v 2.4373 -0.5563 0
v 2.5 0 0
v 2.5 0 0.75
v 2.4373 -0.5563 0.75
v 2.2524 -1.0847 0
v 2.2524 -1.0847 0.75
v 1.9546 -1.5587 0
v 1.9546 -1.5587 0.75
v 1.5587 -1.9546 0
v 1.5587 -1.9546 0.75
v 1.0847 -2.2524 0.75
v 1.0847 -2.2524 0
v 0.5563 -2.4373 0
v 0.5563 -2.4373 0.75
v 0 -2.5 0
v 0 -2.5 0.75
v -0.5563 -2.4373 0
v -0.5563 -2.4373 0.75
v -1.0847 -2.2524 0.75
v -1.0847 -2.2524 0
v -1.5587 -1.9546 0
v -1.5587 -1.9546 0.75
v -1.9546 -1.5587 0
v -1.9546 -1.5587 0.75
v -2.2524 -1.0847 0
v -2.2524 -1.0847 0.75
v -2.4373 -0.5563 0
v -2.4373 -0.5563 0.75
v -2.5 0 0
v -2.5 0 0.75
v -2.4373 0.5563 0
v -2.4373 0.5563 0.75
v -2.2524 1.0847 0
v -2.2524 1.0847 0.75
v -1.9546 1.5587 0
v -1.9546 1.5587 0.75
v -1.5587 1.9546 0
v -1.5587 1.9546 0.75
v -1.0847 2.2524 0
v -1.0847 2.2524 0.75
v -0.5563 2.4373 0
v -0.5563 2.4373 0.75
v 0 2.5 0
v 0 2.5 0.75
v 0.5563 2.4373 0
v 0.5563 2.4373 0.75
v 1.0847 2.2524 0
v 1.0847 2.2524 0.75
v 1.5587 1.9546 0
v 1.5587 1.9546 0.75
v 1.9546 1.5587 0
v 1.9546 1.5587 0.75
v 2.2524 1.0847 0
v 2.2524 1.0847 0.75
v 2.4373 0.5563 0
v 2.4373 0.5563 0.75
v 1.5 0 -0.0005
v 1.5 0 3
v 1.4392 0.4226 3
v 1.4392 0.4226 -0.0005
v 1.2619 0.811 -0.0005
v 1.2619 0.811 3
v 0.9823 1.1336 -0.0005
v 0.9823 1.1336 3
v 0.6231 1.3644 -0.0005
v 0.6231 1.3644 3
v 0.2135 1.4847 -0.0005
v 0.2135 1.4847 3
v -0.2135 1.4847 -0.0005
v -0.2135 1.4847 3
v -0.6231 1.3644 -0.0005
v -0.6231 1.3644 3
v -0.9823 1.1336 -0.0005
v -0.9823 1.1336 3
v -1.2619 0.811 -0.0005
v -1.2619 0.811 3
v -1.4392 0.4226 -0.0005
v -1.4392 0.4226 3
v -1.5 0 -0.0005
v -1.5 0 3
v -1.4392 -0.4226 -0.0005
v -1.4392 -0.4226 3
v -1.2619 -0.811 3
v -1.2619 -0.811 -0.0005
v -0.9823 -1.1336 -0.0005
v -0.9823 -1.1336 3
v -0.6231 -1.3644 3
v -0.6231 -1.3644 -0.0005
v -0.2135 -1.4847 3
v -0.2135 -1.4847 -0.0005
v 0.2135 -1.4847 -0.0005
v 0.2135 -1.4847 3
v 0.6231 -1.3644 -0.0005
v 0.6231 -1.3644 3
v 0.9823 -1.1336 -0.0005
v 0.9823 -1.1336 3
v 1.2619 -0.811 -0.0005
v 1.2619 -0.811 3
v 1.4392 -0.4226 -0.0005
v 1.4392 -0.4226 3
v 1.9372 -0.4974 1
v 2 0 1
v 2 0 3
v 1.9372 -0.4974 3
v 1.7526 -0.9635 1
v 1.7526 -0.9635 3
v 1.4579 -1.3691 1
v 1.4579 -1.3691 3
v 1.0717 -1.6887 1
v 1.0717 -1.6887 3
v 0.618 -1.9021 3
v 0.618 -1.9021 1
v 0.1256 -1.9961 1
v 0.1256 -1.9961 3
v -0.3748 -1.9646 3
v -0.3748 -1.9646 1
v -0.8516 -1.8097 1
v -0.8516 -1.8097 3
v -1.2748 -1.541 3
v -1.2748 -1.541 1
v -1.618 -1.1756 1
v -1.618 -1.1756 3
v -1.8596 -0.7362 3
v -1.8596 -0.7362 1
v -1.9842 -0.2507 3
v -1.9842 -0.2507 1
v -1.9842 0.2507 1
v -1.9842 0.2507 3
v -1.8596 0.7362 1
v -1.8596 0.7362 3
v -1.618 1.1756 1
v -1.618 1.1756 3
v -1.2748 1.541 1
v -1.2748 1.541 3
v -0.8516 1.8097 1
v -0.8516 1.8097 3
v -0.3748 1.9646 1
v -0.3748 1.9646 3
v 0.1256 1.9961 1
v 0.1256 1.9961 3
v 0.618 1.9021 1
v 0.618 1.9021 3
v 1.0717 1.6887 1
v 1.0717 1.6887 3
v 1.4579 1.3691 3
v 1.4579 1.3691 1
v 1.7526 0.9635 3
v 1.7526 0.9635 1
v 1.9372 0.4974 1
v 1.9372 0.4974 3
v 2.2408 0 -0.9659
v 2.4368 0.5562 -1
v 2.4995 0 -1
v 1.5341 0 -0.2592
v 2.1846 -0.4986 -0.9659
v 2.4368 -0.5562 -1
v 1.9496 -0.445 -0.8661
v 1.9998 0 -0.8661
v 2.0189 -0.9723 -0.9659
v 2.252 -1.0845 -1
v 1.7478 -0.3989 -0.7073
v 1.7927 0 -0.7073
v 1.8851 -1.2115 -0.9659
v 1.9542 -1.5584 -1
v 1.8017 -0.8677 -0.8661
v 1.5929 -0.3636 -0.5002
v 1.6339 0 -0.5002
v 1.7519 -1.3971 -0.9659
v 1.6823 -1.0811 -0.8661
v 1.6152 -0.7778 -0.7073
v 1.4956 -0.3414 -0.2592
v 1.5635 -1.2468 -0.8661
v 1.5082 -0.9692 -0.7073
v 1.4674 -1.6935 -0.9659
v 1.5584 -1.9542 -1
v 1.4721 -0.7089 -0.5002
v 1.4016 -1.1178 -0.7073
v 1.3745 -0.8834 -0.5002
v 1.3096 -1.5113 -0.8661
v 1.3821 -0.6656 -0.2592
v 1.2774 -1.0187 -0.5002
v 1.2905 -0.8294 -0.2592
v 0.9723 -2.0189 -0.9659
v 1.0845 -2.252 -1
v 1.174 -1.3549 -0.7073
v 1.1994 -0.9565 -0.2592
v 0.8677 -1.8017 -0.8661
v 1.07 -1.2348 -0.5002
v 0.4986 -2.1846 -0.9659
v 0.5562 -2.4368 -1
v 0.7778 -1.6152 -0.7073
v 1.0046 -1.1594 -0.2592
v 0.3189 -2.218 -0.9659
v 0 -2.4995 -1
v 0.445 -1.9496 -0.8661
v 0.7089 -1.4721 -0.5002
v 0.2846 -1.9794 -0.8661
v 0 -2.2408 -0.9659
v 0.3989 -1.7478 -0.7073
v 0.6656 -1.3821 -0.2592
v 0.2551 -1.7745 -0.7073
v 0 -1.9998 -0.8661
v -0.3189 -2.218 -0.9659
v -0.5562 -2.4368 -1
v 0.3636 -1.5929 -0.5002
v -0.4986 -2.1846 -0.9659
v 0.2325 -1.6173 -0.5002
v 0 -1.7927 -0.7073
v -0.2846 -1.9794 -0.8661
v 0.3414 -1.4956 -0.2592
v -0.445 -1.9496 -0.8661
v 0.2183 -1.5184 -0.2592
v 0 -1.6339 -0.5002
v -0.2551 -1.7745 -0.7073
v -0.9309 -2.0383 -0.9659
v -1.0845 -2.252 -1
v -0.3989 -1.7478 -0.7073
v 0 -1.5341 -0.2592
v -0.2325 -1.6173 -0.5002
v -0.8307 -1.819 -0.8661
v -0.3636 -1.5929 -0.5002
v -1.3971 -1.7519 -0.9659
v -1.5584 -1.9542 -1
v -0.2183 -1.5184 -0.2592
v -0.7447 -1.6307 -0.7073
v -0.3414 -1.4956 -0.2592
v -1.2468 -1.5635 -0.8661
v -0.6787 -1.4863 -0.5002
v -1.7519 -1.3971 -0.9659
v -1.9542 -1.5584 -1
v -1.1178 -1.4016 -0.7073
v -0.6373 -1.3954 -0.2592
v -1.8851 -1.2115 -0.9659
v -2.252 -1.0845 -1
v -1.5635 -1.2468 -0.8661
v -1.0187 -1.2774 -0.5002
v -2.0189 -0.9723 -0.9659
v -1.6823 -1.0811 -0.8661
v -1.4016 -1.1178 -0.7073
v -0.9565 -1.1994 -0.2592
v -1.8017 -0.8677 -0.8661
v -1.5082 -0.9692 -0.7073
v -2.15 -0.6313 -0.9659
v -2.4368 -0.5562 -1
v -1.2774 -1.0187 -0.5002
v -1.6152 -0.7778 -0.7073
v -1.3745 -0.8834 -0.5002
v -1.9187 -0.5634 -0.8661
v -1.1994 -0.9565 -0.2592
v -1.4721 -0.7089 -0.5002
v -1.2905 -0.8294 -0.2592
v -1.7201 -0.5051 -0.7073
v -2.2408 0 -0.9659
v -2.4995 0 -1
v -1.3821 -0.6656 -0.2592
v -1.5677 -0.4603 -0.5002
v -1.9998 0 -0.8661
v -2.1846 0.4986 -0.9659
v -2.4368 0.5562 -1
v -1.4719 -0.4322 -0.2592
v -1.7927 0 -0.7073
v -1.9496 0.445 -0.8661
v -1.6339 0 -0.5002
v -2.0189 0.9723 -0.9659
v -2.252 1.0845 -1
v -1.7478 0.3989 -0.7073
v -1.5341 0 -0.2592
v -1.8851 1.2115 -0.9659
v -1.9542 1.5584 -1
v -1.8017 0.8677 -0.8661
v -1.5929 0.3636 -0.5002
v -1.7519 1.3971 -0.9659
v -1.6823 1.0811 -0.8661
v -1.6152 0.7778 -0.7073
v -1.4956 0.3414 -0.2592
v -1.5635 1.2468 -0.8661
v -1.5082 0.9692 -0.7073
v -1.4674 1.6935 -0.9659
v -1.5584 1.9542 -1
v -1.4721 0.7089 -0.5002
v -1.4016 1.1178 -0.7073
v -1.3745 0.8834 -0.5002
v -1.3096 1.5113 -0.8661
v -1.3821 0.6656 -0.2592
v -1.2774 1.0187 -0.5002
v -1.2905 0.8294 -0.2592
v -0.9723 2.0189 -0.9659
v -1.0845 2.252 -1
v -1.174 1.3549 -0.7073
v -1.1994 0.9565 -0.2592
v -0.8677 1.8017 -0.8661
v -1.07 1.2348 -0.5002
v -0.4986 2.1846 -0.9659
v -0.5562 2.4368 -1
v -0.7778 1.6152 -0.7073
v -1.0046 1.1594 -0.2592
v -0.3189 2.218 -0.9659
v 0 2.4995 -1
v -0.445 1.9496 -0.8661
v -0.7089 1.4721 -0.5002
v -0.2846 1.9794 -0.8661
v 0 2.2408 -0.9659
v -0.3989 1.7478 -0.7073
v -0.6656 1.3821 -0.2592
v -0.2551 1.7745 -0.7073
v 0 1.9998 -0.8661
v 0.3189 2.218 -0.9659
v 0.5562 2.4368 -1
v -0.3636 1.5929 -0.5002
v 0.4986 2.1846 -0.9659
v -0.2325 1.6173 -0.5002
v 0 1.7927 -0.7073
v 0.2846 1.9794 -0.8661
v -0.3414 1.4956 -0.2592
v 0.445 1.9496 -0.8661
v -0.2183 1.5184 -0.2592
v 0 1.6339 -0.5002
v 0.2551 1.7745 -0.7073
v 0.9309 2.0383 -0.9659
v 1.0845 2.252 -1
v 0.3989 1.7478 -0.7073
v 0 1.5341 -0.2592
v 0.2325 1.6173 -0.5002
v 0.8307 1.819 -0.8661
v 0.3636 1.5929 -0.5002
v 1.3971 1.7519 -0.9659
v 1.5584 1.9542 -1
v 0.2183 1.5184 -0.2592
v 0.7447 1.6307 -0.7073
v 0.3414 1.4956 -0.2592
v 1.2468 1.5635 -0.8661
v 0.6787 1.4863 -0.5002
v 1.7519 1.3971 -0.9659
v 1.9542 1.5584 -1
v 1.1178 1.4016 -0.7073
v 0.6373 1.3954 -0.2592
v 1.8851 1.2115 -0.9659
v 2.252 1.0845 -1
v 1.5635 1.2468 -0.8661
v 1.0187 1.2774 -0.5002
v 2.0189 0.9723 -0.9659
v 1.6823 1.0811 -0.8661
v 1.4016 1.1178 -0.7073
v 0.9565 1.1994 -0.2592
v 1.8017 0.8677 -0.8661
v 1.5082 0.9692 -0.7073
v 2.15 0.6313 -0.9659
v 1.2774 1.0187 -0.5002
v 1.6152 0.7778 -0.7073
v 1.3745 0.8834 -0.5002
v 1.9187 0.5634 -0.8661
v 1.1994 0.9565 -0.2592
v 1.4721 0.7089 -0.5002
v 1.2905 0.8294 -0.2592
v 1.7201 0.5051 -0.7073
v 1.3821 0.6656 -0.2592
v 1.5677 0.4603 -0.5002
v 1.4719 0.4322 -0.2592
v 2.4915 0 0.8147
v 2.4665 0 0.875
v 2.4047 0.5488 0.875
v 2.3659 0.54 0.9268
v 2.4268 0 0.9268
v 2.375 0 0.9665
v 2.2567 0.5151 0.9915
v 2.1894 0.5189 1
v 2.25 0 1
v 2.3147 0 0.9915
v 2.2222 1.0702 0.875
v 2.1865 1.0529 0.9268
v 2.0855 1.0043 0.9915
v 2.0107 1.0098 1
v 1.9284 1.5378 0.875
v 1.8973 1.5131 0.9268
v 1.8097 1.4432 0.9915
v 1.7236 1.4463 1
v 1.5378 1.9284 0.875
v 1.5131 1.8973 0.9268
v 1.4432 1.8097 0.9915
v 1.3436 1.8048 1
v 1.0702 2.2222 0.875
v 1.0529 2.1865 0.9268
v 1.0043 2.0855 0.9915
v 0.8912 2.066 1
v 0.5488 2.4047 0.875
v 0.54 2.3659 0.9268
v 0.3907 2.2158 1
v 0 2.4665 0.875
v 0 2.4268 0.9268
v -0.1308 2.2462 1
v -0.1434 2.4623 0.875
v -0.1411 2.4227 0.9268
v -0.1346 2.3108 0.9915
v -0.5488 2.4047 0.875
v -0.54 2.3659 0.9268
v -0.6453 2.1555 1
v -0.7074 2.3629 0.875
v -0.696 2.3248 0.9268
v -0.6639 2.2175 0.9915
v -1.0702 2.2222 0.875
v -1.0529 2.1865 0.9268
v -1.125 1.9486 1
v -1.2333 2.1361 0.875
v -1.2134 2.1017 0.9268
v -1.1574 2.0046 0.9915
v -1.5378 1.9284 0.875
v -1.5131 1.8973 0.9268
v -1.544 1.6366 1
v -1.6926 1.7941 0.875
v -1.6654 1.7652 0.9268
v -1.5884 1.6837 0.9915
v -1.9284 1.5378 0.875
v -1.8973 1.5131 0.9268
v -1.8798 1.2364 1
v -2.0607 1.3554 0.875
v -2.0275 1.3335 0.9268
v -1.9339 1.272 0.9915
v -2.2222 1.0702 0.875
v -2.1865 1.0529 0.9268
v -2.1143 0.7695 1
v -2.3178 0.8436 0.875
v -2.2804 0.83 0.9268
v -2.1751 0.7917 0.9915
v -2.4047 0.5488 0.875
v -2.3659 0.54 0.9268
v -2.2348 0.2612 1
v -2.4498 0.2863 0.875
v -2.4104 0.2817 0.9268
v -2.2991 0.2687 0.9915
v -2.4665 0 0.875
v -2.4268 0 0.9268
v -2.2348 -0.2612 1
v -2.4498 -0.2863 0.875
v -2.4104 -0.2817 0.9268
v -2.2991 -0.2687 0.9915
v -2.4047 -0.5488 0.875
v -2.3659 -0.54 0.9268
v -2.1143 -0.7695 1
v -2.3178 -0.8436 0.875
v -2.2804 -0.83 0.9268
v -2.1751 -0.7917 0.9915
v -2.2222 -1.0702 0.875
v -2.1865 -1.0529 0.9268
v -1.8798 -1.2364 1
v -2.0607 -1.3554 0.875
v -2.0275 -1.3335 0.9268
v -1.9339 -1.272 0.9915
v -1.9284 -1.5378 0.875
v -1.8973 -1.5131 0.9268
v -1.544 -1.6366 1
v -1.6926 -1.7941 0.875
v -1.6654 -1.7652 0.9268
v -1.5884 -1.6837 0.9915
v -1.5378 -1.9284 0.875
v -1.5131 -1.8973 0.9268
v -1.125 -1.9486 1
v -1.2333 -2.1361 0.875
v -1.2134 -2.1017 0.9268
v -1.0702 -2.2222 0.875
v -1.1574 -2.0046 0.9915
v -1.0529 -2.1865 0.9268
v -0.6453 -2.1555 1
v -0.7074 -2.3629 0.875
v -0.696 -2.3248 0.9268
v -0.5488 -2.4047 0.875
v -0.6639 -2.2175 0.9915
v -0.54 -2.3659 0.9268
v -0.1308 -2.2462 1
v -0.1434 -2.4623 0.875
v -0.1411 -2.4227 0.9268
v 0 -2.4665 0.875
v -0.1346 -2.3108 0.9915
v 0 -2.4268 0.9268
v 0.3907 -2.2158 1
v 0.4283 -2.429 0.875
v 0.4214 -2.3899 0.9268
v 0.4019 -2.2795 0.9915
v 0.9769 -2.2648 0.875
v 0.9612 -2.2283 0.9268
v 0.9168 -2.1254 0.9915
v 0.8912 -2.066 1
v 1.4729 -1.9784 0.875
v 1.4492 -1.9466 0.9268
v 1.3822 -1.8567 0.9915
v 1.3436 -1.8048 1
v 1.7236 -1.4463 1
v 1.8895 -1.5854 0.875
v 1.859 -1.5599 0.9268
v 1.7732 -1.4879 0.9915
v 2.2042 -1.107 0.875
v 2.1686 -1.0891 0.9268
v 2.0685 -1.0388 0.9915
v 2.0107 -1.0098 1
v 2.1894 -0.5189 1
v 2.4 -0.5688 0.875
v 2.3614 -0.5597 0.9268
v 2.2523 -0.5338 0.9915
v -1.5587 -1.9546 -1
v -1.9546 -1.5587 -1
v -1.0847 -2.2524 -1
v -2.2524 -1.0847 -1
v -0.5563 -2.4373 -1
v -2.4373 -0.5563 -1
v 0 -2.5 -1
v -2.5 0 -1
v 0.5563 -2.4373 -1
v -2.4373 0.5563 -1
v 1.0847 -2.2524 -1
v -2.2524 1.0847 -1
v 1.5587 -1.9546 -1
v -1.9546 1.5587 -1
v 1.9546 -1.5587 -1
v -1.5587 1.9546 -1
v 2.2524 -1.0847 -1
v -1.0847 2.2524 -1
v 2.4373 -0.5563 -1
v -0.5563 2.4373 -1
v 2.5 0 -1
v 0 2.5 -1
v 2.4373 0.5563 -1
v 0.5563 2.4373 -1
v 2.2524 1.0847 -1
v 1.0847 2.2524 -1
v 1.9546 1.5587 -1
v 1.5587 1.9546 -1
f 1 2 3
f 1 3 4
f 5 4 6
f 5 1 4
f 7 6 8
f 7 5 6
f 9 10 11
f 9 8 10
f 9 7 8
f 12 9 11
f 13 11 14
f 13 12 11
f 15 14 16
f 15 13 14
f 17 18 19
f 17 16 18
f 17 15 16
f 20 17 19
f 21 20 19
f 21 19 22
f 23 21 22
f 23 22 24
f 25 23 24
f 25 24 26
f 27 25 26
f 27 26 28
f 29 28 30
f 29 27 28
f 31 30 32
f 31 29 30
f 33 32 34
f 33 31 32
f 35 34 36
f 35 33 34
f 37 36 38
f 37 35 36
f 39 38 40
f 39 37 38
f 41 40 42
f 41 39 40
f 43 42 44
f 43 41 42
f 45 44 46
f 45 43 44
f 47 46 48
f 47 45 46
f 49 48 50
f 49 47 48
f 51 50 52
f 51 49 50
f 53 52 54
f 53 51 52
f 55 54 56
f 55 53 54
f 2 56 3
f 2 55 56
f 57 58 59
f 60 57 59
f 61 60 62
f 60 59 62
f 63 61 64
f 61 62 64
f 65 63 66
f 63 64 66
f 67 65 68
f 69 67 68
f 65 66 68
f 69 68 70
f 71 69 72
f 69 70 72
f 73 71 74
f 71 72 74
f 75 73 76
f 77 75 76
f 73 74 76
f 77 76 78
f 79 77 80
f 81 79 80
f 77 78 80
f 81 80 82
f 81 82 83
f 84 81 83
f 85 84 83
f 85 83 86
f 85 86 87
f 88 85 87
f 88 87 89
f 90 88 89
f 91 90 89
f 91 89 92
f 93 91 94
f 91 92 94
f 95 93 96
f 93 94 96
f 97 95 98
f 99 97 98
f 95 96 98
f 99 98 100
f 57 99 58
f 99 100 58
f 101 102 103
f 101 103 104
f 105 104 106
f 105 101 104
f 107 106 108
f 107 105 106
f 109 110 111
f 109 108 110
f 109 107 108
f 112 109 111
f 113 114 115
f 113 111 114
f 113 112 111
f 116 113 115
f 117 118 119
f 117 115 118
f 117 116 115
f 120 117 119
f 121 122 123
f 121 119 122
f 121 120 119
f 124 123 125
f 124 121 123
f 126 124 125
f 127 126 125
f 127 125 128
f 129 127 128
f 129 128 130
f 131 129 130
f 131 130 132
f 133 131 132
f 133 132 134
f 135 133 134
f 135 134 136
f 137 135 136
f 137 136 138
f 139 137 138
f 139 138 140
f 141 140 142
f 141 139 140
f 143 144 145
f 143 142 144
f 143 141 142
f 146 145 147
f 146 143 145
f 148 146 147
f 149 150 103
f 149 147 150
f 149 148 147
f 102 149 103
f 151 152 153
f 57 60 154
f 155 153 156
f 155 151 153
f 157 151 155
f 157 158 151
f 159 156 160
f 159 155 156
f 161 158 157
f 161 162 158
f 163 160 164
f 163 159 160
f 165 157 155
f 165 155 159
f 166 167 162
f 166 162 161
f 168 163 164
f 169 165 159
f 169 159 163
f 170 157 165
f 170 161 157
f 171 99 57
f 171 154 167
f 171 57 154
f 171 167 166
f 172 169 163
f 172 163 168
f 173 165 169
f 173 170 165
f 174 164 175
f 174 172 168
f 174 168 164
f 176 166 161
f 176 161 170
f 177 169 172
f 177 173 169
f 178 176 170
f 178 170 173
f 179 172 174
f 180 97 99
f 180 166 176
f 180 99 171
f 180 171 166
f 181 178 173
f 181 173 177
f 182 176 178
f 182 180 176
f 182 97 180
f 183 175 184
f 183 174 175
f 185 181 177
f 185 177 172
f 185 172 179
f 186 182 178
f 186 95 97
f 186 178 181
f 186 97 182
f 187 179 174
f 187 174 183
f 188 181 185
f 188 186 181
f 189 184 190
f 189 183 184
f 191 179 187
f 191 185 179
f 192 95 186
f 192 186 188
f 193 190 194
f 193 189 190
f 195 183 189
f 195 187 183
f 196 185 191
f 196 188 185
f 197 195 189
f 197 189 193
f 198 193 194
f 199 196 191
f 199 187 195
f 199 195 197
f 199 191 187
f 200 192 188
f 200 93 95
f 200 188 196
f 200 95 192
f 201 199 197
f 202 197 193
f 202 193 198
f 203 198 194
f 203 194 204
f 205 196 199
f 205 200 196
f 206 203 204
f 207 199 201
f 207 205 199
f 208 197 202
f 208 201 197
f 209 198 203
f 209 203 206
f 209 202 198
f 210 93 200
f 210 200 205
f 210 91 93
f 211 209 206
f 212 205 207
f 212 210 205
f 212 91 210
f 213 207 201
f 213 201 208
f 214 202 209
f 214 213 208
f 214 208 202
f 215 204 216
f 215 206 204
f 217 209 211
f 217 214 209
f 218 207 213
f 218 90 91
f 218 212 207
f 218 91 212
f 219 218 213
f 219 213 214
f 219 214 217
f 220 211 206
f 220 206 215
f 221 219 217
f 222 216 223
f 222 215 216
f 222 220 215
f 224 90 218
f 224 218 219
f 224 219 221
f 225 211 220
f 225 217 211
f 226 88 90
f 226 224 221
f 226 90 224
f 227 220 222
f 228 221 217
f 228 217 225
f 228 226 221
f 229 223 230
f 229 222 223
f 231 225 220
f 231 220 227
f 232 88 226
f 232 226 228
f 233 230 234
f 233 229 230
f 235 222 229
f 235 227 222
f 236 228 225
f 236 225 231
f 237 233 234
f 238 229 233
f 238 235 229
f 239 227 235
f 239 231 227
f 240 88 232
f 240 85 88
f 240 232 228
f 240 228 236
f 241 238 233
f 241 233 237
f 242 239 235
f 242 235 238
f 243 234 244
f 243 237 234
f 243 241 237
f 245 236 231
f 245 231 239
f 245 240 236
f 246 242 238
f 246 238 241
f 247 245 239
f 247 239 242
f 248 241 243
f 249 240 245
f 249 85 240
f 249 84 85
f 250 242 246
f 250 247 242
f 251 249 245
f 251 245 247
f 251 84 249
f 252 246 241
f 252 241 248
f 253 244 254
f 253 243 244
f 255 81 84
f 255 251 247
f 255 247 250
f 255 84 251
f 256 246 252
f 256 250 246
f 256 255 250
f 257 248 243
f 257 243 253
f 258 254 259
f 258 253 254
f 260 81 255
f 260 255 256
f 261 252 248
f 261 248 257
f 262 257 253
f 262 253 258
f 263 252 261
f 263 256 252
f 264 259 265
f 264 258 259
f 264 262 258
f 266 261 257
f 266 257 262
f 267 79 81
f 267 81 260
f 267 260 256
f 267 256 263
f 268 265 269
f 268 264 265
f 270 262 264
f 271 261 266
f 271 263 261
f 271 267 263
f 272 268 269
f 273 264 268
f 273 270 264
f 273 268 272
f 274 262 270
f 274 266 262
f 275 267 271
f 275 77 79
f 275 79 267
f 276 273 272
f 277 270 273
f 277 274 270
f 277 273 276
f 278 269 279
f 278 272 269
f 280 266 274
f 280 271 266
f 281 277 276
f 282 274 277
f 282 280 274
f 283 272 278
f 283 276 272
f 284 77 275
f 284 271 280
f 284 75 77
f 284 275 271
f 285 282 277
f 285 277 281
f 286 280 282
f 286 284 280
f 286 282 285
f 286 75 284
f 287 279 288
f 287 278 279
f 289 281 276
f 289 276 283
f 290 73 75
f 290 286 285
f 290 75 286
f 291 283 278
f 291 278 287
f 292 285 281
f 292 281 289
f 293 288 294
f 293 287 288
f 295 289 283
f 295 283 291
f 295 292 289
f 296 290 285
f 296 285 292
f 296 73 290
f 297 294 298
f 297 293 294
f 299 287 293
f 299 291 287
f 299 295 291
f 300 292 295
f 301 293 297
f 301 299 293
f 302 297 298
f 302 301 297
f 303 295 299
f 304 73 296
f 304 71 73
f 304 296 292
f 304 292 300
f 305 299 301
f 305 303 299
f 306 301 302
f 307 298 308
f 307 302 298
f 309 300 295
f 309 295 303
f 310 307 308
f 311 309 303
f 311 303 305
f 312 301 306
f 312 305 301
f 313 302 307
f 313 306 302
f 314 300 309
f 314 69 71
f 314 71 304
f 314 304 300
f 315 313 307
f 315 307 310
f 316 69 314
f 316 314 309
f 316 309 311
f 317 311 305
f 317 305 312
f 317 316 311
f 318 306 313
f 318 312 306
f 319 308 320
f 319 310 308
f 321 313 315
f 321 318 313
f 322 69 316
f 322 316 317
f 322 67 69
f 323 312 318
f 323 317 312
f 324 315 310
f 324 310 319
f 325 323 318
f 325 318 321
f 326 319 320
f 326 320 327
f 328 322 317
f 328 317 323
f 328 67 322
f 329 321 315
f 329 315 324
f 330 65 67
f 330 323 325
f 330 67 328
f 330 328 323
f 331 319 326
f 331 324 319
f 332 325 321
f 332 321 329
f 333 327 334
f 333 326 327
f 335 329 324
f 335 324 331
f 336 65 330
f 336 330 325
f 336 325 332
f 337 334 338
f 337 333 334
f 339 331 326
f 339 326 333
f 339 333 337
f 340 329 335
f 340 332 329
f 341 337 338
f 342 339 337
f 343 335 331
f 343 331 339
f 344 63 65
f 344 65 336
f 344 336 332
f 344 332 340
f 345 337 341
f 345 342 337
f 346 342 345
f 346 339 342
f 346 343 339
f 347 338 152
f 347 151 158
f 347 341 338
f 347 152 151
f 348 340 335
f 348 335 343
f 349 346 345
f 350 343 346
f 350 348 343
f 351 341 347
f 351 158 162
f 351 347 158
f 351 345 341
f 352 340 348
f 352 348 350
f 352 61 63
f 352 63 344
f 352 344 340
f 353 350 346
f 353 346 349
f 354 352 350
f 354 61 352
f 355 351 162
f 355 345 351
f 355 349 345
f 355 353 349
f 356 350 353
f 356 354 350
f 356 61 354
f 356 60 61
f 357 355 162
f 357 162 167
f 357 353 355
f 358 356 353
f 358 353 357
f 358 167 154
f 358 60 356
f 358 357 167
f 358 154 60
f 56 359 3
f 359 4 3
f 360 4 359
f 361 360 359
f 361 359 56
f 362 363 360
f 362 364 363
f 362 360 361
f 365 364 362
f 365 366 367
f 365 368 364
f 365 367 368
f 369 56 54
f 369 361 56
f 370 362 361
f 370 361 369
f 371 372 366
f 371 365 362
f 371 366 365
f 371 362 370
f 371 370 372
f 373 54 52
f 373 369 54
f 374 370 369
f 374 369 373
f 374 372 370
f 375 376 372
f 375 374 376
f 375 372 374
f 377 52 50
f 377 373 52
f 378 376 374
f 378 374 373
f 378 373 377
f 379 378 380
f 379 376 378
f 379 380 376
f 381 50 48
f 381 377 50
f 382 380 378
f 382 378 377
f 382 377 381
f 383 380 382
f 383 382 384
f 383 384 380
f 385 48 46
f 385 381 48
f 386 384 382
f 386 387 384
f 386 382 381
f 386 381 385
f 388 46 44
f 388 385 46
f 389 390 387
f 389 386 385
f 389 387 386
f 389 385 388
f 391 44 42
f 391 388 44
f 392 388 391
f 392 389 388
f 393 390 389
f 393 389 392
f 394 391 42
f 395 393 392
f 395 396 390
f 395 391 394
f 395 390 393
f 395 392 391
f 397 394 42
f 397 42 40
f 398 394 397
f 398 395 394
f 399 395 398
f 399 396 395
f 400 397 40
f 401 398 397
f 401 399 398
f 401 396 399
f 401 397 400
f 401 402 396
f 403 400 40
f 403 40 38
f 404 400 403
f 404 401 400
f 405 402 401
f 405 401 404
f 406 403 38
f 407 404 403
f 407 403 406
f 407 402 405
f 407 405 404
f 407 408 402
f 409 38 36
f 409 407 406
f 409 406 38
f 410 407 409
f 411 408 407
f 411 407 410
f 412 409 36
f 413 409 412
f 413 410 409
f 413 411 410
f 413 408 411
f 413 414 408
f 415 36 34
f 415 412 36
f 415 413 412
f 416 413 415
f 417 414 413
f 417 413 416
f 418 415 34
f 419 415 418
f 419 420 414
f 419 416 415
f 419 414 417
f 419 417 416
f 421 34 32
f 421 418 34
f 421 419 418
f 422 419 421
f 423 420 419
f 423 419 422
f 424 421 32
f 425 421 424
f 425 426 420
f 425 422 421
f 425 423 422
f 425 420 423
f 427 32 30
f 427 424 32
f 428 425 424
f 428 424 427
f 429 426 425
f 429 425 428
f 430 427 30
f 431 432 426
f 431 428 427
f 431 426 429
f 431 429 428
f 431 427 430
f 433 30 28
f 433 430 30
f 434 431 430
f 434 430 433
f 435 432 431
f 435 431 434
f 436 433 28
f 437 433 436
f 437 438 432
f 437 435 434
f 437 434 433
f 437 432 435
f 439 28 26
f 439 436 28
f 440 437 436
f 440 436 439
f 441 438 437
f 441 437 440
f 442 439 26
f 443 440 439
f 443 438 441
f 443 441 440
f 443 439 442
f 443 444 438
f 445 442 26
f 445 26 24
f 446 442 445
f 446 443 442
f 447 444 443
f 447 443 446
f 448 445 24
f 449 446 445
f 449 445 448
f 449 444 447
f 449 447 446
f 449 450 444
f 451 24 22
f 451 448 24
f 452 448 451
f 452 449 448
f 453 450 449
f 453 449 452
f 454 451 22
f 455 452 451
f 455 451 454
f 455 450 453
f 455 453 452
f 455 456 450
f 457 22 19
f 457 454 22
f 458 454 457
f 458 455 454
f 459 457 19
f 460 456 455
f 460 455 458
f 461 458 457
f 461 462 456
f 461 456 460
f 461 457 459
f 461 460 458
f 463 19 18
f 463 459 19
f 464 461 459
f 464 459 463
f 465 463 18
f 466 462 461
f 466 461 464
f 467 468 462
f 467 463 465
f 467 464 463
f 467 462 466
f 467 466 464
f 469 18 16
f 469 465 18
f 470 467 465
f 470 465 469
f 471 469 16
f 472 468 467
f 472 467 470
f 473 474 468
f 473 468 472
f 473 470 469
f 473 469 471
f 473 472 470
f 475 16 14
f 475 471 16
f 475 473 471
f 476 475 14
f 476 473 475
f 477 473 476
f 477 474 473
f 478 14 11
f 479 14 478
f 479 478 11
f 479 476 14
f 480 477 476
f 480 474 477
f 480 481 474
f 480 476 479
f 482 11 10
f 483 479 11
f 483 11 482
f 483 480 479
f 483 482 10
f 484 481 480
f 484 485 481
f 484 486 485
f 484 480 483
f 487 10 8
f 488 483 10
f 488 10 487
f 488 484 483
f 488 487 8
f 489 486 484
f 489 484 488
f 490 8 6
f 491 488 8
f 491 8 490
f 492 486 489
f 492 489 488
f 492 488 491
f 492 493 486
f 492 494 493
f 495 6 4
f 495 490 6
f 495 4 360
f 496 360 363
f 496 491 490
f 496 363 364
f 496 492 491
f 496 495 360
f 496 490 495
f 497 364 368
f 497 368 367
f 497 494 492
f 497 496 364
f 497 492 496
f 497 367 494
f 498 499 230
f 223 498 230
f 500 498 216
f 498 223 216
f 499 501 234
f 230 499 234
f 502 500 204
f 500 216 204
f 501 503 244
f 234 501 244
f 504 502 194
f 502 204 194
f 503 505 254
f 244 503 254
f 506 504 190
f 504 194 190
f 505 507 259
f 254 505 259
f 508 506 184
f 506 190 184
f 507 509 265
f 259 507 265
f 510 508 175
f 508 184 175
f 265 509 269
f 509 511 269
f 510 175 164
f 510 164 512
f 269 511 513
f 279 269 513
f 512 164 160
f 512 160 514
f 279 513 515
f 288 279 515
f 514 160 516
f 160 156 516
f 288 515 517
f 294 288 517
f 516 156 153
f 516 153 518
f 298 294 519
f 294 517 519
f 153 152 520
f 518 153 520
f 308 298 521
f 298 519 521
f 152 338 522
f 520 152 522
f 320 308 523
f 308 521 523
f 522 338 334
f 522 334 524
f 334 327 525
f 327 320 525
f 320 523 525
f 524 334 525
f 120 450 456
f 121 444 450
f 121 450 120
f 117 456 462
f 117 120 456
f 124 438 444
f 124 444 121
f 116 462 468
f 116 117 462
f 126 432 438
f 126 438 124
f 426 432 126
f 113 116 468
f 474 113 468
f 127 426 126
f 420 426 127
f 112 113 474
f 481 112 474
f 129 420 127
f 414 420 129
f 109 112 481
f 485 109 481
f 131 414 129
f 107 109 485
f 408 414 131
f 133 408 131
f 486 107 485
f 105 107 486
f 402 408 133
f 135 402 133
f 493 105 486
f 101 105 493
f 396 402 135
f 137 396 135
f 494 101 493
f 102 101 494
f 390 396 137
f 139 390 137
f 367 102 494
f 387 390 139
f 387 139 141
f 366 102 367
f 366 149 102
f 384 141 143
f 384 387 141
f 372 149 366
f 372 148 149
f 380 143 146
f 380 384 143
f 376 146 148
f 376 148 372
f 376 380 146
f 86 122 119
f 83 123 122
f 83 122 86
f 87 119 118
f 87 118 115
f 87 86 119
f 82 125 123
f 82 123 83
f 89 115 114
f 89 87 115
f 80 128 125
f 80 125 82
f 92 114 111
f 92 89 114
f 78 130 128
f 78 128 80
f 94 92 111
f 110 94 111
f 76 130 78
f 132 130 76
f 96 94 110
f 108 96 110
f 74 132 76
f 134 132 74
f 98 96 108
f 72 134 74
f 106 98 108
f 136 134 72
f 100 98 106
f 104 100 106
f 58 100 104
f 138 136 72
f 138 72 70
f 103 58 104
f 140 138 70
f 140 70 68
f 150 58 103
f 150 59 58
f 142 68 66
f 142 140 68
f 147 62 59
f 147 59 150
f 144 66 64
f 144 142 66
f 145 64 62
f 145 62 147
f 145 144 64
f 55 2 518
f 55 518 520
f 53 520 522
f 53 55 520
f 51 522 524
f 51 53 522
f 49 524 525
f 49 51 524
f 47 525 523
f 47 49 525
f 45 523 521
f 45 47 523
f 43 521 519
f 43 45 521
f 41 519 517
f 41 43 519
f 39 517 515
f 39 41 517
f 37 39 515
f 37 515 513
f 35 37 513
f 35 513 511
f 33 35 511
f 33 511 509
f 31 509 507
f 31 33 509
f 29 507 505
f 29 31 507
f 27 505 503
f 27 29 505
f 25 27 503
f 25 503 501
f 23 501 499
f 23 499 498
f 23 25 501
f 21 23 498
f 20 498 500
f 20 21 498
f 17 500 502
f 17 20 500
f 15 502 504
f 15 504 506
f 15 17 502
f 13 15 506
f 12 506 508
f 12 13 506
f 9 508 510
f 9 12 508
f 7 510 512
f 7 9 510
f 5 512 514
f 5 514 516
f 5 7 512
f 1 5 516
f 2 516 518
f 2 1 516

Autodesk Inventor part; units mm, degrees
sketch "Skizze1" plane through (0, 0, 0) normal (0, 0, 1) x (1, 0, 0)
  circle A0 centre (0, 0) radius 2.5
  dimension "d0" = 5
extrude "Extrusion1" add sketch "Skizze1" along normal mid plane 2
sketch "Skizze2" plane through (0, 0, 1) normal (0, 0, 1) x (1, 0, 0)
  circle A0 centre (0, 0) radius 2
  dimension "d3" = 4
extrude "Extrusion2" add sketch "Skizze2" along normal blind 2
sketch "Skizze3" plane through (0, 0, 3) normal (0, 0, 1) x (1, 0, 0)
  circle A0 centre (0, 0) radius 1.5
  dimension "d6" = 3
extrude "Extrusion3" cut sketch "Skizze3" against normal blind 5
fillet "Rundung1" radius 1 1 edges at (-1.5, 0, -1)
thread "Gewinde1" size "M3x0.5" class "6H" standard "ANSI Metric M Profile" full length
thread "Gewinde2" size "M4x0.7" class "6g" standard "ANSI Metric M Profile" full length
fillet "Rundung2" radius 0.25 1 edges at (-2.5, 0, 1)
properties part number "SchleppstangeBefestigungUnten"
